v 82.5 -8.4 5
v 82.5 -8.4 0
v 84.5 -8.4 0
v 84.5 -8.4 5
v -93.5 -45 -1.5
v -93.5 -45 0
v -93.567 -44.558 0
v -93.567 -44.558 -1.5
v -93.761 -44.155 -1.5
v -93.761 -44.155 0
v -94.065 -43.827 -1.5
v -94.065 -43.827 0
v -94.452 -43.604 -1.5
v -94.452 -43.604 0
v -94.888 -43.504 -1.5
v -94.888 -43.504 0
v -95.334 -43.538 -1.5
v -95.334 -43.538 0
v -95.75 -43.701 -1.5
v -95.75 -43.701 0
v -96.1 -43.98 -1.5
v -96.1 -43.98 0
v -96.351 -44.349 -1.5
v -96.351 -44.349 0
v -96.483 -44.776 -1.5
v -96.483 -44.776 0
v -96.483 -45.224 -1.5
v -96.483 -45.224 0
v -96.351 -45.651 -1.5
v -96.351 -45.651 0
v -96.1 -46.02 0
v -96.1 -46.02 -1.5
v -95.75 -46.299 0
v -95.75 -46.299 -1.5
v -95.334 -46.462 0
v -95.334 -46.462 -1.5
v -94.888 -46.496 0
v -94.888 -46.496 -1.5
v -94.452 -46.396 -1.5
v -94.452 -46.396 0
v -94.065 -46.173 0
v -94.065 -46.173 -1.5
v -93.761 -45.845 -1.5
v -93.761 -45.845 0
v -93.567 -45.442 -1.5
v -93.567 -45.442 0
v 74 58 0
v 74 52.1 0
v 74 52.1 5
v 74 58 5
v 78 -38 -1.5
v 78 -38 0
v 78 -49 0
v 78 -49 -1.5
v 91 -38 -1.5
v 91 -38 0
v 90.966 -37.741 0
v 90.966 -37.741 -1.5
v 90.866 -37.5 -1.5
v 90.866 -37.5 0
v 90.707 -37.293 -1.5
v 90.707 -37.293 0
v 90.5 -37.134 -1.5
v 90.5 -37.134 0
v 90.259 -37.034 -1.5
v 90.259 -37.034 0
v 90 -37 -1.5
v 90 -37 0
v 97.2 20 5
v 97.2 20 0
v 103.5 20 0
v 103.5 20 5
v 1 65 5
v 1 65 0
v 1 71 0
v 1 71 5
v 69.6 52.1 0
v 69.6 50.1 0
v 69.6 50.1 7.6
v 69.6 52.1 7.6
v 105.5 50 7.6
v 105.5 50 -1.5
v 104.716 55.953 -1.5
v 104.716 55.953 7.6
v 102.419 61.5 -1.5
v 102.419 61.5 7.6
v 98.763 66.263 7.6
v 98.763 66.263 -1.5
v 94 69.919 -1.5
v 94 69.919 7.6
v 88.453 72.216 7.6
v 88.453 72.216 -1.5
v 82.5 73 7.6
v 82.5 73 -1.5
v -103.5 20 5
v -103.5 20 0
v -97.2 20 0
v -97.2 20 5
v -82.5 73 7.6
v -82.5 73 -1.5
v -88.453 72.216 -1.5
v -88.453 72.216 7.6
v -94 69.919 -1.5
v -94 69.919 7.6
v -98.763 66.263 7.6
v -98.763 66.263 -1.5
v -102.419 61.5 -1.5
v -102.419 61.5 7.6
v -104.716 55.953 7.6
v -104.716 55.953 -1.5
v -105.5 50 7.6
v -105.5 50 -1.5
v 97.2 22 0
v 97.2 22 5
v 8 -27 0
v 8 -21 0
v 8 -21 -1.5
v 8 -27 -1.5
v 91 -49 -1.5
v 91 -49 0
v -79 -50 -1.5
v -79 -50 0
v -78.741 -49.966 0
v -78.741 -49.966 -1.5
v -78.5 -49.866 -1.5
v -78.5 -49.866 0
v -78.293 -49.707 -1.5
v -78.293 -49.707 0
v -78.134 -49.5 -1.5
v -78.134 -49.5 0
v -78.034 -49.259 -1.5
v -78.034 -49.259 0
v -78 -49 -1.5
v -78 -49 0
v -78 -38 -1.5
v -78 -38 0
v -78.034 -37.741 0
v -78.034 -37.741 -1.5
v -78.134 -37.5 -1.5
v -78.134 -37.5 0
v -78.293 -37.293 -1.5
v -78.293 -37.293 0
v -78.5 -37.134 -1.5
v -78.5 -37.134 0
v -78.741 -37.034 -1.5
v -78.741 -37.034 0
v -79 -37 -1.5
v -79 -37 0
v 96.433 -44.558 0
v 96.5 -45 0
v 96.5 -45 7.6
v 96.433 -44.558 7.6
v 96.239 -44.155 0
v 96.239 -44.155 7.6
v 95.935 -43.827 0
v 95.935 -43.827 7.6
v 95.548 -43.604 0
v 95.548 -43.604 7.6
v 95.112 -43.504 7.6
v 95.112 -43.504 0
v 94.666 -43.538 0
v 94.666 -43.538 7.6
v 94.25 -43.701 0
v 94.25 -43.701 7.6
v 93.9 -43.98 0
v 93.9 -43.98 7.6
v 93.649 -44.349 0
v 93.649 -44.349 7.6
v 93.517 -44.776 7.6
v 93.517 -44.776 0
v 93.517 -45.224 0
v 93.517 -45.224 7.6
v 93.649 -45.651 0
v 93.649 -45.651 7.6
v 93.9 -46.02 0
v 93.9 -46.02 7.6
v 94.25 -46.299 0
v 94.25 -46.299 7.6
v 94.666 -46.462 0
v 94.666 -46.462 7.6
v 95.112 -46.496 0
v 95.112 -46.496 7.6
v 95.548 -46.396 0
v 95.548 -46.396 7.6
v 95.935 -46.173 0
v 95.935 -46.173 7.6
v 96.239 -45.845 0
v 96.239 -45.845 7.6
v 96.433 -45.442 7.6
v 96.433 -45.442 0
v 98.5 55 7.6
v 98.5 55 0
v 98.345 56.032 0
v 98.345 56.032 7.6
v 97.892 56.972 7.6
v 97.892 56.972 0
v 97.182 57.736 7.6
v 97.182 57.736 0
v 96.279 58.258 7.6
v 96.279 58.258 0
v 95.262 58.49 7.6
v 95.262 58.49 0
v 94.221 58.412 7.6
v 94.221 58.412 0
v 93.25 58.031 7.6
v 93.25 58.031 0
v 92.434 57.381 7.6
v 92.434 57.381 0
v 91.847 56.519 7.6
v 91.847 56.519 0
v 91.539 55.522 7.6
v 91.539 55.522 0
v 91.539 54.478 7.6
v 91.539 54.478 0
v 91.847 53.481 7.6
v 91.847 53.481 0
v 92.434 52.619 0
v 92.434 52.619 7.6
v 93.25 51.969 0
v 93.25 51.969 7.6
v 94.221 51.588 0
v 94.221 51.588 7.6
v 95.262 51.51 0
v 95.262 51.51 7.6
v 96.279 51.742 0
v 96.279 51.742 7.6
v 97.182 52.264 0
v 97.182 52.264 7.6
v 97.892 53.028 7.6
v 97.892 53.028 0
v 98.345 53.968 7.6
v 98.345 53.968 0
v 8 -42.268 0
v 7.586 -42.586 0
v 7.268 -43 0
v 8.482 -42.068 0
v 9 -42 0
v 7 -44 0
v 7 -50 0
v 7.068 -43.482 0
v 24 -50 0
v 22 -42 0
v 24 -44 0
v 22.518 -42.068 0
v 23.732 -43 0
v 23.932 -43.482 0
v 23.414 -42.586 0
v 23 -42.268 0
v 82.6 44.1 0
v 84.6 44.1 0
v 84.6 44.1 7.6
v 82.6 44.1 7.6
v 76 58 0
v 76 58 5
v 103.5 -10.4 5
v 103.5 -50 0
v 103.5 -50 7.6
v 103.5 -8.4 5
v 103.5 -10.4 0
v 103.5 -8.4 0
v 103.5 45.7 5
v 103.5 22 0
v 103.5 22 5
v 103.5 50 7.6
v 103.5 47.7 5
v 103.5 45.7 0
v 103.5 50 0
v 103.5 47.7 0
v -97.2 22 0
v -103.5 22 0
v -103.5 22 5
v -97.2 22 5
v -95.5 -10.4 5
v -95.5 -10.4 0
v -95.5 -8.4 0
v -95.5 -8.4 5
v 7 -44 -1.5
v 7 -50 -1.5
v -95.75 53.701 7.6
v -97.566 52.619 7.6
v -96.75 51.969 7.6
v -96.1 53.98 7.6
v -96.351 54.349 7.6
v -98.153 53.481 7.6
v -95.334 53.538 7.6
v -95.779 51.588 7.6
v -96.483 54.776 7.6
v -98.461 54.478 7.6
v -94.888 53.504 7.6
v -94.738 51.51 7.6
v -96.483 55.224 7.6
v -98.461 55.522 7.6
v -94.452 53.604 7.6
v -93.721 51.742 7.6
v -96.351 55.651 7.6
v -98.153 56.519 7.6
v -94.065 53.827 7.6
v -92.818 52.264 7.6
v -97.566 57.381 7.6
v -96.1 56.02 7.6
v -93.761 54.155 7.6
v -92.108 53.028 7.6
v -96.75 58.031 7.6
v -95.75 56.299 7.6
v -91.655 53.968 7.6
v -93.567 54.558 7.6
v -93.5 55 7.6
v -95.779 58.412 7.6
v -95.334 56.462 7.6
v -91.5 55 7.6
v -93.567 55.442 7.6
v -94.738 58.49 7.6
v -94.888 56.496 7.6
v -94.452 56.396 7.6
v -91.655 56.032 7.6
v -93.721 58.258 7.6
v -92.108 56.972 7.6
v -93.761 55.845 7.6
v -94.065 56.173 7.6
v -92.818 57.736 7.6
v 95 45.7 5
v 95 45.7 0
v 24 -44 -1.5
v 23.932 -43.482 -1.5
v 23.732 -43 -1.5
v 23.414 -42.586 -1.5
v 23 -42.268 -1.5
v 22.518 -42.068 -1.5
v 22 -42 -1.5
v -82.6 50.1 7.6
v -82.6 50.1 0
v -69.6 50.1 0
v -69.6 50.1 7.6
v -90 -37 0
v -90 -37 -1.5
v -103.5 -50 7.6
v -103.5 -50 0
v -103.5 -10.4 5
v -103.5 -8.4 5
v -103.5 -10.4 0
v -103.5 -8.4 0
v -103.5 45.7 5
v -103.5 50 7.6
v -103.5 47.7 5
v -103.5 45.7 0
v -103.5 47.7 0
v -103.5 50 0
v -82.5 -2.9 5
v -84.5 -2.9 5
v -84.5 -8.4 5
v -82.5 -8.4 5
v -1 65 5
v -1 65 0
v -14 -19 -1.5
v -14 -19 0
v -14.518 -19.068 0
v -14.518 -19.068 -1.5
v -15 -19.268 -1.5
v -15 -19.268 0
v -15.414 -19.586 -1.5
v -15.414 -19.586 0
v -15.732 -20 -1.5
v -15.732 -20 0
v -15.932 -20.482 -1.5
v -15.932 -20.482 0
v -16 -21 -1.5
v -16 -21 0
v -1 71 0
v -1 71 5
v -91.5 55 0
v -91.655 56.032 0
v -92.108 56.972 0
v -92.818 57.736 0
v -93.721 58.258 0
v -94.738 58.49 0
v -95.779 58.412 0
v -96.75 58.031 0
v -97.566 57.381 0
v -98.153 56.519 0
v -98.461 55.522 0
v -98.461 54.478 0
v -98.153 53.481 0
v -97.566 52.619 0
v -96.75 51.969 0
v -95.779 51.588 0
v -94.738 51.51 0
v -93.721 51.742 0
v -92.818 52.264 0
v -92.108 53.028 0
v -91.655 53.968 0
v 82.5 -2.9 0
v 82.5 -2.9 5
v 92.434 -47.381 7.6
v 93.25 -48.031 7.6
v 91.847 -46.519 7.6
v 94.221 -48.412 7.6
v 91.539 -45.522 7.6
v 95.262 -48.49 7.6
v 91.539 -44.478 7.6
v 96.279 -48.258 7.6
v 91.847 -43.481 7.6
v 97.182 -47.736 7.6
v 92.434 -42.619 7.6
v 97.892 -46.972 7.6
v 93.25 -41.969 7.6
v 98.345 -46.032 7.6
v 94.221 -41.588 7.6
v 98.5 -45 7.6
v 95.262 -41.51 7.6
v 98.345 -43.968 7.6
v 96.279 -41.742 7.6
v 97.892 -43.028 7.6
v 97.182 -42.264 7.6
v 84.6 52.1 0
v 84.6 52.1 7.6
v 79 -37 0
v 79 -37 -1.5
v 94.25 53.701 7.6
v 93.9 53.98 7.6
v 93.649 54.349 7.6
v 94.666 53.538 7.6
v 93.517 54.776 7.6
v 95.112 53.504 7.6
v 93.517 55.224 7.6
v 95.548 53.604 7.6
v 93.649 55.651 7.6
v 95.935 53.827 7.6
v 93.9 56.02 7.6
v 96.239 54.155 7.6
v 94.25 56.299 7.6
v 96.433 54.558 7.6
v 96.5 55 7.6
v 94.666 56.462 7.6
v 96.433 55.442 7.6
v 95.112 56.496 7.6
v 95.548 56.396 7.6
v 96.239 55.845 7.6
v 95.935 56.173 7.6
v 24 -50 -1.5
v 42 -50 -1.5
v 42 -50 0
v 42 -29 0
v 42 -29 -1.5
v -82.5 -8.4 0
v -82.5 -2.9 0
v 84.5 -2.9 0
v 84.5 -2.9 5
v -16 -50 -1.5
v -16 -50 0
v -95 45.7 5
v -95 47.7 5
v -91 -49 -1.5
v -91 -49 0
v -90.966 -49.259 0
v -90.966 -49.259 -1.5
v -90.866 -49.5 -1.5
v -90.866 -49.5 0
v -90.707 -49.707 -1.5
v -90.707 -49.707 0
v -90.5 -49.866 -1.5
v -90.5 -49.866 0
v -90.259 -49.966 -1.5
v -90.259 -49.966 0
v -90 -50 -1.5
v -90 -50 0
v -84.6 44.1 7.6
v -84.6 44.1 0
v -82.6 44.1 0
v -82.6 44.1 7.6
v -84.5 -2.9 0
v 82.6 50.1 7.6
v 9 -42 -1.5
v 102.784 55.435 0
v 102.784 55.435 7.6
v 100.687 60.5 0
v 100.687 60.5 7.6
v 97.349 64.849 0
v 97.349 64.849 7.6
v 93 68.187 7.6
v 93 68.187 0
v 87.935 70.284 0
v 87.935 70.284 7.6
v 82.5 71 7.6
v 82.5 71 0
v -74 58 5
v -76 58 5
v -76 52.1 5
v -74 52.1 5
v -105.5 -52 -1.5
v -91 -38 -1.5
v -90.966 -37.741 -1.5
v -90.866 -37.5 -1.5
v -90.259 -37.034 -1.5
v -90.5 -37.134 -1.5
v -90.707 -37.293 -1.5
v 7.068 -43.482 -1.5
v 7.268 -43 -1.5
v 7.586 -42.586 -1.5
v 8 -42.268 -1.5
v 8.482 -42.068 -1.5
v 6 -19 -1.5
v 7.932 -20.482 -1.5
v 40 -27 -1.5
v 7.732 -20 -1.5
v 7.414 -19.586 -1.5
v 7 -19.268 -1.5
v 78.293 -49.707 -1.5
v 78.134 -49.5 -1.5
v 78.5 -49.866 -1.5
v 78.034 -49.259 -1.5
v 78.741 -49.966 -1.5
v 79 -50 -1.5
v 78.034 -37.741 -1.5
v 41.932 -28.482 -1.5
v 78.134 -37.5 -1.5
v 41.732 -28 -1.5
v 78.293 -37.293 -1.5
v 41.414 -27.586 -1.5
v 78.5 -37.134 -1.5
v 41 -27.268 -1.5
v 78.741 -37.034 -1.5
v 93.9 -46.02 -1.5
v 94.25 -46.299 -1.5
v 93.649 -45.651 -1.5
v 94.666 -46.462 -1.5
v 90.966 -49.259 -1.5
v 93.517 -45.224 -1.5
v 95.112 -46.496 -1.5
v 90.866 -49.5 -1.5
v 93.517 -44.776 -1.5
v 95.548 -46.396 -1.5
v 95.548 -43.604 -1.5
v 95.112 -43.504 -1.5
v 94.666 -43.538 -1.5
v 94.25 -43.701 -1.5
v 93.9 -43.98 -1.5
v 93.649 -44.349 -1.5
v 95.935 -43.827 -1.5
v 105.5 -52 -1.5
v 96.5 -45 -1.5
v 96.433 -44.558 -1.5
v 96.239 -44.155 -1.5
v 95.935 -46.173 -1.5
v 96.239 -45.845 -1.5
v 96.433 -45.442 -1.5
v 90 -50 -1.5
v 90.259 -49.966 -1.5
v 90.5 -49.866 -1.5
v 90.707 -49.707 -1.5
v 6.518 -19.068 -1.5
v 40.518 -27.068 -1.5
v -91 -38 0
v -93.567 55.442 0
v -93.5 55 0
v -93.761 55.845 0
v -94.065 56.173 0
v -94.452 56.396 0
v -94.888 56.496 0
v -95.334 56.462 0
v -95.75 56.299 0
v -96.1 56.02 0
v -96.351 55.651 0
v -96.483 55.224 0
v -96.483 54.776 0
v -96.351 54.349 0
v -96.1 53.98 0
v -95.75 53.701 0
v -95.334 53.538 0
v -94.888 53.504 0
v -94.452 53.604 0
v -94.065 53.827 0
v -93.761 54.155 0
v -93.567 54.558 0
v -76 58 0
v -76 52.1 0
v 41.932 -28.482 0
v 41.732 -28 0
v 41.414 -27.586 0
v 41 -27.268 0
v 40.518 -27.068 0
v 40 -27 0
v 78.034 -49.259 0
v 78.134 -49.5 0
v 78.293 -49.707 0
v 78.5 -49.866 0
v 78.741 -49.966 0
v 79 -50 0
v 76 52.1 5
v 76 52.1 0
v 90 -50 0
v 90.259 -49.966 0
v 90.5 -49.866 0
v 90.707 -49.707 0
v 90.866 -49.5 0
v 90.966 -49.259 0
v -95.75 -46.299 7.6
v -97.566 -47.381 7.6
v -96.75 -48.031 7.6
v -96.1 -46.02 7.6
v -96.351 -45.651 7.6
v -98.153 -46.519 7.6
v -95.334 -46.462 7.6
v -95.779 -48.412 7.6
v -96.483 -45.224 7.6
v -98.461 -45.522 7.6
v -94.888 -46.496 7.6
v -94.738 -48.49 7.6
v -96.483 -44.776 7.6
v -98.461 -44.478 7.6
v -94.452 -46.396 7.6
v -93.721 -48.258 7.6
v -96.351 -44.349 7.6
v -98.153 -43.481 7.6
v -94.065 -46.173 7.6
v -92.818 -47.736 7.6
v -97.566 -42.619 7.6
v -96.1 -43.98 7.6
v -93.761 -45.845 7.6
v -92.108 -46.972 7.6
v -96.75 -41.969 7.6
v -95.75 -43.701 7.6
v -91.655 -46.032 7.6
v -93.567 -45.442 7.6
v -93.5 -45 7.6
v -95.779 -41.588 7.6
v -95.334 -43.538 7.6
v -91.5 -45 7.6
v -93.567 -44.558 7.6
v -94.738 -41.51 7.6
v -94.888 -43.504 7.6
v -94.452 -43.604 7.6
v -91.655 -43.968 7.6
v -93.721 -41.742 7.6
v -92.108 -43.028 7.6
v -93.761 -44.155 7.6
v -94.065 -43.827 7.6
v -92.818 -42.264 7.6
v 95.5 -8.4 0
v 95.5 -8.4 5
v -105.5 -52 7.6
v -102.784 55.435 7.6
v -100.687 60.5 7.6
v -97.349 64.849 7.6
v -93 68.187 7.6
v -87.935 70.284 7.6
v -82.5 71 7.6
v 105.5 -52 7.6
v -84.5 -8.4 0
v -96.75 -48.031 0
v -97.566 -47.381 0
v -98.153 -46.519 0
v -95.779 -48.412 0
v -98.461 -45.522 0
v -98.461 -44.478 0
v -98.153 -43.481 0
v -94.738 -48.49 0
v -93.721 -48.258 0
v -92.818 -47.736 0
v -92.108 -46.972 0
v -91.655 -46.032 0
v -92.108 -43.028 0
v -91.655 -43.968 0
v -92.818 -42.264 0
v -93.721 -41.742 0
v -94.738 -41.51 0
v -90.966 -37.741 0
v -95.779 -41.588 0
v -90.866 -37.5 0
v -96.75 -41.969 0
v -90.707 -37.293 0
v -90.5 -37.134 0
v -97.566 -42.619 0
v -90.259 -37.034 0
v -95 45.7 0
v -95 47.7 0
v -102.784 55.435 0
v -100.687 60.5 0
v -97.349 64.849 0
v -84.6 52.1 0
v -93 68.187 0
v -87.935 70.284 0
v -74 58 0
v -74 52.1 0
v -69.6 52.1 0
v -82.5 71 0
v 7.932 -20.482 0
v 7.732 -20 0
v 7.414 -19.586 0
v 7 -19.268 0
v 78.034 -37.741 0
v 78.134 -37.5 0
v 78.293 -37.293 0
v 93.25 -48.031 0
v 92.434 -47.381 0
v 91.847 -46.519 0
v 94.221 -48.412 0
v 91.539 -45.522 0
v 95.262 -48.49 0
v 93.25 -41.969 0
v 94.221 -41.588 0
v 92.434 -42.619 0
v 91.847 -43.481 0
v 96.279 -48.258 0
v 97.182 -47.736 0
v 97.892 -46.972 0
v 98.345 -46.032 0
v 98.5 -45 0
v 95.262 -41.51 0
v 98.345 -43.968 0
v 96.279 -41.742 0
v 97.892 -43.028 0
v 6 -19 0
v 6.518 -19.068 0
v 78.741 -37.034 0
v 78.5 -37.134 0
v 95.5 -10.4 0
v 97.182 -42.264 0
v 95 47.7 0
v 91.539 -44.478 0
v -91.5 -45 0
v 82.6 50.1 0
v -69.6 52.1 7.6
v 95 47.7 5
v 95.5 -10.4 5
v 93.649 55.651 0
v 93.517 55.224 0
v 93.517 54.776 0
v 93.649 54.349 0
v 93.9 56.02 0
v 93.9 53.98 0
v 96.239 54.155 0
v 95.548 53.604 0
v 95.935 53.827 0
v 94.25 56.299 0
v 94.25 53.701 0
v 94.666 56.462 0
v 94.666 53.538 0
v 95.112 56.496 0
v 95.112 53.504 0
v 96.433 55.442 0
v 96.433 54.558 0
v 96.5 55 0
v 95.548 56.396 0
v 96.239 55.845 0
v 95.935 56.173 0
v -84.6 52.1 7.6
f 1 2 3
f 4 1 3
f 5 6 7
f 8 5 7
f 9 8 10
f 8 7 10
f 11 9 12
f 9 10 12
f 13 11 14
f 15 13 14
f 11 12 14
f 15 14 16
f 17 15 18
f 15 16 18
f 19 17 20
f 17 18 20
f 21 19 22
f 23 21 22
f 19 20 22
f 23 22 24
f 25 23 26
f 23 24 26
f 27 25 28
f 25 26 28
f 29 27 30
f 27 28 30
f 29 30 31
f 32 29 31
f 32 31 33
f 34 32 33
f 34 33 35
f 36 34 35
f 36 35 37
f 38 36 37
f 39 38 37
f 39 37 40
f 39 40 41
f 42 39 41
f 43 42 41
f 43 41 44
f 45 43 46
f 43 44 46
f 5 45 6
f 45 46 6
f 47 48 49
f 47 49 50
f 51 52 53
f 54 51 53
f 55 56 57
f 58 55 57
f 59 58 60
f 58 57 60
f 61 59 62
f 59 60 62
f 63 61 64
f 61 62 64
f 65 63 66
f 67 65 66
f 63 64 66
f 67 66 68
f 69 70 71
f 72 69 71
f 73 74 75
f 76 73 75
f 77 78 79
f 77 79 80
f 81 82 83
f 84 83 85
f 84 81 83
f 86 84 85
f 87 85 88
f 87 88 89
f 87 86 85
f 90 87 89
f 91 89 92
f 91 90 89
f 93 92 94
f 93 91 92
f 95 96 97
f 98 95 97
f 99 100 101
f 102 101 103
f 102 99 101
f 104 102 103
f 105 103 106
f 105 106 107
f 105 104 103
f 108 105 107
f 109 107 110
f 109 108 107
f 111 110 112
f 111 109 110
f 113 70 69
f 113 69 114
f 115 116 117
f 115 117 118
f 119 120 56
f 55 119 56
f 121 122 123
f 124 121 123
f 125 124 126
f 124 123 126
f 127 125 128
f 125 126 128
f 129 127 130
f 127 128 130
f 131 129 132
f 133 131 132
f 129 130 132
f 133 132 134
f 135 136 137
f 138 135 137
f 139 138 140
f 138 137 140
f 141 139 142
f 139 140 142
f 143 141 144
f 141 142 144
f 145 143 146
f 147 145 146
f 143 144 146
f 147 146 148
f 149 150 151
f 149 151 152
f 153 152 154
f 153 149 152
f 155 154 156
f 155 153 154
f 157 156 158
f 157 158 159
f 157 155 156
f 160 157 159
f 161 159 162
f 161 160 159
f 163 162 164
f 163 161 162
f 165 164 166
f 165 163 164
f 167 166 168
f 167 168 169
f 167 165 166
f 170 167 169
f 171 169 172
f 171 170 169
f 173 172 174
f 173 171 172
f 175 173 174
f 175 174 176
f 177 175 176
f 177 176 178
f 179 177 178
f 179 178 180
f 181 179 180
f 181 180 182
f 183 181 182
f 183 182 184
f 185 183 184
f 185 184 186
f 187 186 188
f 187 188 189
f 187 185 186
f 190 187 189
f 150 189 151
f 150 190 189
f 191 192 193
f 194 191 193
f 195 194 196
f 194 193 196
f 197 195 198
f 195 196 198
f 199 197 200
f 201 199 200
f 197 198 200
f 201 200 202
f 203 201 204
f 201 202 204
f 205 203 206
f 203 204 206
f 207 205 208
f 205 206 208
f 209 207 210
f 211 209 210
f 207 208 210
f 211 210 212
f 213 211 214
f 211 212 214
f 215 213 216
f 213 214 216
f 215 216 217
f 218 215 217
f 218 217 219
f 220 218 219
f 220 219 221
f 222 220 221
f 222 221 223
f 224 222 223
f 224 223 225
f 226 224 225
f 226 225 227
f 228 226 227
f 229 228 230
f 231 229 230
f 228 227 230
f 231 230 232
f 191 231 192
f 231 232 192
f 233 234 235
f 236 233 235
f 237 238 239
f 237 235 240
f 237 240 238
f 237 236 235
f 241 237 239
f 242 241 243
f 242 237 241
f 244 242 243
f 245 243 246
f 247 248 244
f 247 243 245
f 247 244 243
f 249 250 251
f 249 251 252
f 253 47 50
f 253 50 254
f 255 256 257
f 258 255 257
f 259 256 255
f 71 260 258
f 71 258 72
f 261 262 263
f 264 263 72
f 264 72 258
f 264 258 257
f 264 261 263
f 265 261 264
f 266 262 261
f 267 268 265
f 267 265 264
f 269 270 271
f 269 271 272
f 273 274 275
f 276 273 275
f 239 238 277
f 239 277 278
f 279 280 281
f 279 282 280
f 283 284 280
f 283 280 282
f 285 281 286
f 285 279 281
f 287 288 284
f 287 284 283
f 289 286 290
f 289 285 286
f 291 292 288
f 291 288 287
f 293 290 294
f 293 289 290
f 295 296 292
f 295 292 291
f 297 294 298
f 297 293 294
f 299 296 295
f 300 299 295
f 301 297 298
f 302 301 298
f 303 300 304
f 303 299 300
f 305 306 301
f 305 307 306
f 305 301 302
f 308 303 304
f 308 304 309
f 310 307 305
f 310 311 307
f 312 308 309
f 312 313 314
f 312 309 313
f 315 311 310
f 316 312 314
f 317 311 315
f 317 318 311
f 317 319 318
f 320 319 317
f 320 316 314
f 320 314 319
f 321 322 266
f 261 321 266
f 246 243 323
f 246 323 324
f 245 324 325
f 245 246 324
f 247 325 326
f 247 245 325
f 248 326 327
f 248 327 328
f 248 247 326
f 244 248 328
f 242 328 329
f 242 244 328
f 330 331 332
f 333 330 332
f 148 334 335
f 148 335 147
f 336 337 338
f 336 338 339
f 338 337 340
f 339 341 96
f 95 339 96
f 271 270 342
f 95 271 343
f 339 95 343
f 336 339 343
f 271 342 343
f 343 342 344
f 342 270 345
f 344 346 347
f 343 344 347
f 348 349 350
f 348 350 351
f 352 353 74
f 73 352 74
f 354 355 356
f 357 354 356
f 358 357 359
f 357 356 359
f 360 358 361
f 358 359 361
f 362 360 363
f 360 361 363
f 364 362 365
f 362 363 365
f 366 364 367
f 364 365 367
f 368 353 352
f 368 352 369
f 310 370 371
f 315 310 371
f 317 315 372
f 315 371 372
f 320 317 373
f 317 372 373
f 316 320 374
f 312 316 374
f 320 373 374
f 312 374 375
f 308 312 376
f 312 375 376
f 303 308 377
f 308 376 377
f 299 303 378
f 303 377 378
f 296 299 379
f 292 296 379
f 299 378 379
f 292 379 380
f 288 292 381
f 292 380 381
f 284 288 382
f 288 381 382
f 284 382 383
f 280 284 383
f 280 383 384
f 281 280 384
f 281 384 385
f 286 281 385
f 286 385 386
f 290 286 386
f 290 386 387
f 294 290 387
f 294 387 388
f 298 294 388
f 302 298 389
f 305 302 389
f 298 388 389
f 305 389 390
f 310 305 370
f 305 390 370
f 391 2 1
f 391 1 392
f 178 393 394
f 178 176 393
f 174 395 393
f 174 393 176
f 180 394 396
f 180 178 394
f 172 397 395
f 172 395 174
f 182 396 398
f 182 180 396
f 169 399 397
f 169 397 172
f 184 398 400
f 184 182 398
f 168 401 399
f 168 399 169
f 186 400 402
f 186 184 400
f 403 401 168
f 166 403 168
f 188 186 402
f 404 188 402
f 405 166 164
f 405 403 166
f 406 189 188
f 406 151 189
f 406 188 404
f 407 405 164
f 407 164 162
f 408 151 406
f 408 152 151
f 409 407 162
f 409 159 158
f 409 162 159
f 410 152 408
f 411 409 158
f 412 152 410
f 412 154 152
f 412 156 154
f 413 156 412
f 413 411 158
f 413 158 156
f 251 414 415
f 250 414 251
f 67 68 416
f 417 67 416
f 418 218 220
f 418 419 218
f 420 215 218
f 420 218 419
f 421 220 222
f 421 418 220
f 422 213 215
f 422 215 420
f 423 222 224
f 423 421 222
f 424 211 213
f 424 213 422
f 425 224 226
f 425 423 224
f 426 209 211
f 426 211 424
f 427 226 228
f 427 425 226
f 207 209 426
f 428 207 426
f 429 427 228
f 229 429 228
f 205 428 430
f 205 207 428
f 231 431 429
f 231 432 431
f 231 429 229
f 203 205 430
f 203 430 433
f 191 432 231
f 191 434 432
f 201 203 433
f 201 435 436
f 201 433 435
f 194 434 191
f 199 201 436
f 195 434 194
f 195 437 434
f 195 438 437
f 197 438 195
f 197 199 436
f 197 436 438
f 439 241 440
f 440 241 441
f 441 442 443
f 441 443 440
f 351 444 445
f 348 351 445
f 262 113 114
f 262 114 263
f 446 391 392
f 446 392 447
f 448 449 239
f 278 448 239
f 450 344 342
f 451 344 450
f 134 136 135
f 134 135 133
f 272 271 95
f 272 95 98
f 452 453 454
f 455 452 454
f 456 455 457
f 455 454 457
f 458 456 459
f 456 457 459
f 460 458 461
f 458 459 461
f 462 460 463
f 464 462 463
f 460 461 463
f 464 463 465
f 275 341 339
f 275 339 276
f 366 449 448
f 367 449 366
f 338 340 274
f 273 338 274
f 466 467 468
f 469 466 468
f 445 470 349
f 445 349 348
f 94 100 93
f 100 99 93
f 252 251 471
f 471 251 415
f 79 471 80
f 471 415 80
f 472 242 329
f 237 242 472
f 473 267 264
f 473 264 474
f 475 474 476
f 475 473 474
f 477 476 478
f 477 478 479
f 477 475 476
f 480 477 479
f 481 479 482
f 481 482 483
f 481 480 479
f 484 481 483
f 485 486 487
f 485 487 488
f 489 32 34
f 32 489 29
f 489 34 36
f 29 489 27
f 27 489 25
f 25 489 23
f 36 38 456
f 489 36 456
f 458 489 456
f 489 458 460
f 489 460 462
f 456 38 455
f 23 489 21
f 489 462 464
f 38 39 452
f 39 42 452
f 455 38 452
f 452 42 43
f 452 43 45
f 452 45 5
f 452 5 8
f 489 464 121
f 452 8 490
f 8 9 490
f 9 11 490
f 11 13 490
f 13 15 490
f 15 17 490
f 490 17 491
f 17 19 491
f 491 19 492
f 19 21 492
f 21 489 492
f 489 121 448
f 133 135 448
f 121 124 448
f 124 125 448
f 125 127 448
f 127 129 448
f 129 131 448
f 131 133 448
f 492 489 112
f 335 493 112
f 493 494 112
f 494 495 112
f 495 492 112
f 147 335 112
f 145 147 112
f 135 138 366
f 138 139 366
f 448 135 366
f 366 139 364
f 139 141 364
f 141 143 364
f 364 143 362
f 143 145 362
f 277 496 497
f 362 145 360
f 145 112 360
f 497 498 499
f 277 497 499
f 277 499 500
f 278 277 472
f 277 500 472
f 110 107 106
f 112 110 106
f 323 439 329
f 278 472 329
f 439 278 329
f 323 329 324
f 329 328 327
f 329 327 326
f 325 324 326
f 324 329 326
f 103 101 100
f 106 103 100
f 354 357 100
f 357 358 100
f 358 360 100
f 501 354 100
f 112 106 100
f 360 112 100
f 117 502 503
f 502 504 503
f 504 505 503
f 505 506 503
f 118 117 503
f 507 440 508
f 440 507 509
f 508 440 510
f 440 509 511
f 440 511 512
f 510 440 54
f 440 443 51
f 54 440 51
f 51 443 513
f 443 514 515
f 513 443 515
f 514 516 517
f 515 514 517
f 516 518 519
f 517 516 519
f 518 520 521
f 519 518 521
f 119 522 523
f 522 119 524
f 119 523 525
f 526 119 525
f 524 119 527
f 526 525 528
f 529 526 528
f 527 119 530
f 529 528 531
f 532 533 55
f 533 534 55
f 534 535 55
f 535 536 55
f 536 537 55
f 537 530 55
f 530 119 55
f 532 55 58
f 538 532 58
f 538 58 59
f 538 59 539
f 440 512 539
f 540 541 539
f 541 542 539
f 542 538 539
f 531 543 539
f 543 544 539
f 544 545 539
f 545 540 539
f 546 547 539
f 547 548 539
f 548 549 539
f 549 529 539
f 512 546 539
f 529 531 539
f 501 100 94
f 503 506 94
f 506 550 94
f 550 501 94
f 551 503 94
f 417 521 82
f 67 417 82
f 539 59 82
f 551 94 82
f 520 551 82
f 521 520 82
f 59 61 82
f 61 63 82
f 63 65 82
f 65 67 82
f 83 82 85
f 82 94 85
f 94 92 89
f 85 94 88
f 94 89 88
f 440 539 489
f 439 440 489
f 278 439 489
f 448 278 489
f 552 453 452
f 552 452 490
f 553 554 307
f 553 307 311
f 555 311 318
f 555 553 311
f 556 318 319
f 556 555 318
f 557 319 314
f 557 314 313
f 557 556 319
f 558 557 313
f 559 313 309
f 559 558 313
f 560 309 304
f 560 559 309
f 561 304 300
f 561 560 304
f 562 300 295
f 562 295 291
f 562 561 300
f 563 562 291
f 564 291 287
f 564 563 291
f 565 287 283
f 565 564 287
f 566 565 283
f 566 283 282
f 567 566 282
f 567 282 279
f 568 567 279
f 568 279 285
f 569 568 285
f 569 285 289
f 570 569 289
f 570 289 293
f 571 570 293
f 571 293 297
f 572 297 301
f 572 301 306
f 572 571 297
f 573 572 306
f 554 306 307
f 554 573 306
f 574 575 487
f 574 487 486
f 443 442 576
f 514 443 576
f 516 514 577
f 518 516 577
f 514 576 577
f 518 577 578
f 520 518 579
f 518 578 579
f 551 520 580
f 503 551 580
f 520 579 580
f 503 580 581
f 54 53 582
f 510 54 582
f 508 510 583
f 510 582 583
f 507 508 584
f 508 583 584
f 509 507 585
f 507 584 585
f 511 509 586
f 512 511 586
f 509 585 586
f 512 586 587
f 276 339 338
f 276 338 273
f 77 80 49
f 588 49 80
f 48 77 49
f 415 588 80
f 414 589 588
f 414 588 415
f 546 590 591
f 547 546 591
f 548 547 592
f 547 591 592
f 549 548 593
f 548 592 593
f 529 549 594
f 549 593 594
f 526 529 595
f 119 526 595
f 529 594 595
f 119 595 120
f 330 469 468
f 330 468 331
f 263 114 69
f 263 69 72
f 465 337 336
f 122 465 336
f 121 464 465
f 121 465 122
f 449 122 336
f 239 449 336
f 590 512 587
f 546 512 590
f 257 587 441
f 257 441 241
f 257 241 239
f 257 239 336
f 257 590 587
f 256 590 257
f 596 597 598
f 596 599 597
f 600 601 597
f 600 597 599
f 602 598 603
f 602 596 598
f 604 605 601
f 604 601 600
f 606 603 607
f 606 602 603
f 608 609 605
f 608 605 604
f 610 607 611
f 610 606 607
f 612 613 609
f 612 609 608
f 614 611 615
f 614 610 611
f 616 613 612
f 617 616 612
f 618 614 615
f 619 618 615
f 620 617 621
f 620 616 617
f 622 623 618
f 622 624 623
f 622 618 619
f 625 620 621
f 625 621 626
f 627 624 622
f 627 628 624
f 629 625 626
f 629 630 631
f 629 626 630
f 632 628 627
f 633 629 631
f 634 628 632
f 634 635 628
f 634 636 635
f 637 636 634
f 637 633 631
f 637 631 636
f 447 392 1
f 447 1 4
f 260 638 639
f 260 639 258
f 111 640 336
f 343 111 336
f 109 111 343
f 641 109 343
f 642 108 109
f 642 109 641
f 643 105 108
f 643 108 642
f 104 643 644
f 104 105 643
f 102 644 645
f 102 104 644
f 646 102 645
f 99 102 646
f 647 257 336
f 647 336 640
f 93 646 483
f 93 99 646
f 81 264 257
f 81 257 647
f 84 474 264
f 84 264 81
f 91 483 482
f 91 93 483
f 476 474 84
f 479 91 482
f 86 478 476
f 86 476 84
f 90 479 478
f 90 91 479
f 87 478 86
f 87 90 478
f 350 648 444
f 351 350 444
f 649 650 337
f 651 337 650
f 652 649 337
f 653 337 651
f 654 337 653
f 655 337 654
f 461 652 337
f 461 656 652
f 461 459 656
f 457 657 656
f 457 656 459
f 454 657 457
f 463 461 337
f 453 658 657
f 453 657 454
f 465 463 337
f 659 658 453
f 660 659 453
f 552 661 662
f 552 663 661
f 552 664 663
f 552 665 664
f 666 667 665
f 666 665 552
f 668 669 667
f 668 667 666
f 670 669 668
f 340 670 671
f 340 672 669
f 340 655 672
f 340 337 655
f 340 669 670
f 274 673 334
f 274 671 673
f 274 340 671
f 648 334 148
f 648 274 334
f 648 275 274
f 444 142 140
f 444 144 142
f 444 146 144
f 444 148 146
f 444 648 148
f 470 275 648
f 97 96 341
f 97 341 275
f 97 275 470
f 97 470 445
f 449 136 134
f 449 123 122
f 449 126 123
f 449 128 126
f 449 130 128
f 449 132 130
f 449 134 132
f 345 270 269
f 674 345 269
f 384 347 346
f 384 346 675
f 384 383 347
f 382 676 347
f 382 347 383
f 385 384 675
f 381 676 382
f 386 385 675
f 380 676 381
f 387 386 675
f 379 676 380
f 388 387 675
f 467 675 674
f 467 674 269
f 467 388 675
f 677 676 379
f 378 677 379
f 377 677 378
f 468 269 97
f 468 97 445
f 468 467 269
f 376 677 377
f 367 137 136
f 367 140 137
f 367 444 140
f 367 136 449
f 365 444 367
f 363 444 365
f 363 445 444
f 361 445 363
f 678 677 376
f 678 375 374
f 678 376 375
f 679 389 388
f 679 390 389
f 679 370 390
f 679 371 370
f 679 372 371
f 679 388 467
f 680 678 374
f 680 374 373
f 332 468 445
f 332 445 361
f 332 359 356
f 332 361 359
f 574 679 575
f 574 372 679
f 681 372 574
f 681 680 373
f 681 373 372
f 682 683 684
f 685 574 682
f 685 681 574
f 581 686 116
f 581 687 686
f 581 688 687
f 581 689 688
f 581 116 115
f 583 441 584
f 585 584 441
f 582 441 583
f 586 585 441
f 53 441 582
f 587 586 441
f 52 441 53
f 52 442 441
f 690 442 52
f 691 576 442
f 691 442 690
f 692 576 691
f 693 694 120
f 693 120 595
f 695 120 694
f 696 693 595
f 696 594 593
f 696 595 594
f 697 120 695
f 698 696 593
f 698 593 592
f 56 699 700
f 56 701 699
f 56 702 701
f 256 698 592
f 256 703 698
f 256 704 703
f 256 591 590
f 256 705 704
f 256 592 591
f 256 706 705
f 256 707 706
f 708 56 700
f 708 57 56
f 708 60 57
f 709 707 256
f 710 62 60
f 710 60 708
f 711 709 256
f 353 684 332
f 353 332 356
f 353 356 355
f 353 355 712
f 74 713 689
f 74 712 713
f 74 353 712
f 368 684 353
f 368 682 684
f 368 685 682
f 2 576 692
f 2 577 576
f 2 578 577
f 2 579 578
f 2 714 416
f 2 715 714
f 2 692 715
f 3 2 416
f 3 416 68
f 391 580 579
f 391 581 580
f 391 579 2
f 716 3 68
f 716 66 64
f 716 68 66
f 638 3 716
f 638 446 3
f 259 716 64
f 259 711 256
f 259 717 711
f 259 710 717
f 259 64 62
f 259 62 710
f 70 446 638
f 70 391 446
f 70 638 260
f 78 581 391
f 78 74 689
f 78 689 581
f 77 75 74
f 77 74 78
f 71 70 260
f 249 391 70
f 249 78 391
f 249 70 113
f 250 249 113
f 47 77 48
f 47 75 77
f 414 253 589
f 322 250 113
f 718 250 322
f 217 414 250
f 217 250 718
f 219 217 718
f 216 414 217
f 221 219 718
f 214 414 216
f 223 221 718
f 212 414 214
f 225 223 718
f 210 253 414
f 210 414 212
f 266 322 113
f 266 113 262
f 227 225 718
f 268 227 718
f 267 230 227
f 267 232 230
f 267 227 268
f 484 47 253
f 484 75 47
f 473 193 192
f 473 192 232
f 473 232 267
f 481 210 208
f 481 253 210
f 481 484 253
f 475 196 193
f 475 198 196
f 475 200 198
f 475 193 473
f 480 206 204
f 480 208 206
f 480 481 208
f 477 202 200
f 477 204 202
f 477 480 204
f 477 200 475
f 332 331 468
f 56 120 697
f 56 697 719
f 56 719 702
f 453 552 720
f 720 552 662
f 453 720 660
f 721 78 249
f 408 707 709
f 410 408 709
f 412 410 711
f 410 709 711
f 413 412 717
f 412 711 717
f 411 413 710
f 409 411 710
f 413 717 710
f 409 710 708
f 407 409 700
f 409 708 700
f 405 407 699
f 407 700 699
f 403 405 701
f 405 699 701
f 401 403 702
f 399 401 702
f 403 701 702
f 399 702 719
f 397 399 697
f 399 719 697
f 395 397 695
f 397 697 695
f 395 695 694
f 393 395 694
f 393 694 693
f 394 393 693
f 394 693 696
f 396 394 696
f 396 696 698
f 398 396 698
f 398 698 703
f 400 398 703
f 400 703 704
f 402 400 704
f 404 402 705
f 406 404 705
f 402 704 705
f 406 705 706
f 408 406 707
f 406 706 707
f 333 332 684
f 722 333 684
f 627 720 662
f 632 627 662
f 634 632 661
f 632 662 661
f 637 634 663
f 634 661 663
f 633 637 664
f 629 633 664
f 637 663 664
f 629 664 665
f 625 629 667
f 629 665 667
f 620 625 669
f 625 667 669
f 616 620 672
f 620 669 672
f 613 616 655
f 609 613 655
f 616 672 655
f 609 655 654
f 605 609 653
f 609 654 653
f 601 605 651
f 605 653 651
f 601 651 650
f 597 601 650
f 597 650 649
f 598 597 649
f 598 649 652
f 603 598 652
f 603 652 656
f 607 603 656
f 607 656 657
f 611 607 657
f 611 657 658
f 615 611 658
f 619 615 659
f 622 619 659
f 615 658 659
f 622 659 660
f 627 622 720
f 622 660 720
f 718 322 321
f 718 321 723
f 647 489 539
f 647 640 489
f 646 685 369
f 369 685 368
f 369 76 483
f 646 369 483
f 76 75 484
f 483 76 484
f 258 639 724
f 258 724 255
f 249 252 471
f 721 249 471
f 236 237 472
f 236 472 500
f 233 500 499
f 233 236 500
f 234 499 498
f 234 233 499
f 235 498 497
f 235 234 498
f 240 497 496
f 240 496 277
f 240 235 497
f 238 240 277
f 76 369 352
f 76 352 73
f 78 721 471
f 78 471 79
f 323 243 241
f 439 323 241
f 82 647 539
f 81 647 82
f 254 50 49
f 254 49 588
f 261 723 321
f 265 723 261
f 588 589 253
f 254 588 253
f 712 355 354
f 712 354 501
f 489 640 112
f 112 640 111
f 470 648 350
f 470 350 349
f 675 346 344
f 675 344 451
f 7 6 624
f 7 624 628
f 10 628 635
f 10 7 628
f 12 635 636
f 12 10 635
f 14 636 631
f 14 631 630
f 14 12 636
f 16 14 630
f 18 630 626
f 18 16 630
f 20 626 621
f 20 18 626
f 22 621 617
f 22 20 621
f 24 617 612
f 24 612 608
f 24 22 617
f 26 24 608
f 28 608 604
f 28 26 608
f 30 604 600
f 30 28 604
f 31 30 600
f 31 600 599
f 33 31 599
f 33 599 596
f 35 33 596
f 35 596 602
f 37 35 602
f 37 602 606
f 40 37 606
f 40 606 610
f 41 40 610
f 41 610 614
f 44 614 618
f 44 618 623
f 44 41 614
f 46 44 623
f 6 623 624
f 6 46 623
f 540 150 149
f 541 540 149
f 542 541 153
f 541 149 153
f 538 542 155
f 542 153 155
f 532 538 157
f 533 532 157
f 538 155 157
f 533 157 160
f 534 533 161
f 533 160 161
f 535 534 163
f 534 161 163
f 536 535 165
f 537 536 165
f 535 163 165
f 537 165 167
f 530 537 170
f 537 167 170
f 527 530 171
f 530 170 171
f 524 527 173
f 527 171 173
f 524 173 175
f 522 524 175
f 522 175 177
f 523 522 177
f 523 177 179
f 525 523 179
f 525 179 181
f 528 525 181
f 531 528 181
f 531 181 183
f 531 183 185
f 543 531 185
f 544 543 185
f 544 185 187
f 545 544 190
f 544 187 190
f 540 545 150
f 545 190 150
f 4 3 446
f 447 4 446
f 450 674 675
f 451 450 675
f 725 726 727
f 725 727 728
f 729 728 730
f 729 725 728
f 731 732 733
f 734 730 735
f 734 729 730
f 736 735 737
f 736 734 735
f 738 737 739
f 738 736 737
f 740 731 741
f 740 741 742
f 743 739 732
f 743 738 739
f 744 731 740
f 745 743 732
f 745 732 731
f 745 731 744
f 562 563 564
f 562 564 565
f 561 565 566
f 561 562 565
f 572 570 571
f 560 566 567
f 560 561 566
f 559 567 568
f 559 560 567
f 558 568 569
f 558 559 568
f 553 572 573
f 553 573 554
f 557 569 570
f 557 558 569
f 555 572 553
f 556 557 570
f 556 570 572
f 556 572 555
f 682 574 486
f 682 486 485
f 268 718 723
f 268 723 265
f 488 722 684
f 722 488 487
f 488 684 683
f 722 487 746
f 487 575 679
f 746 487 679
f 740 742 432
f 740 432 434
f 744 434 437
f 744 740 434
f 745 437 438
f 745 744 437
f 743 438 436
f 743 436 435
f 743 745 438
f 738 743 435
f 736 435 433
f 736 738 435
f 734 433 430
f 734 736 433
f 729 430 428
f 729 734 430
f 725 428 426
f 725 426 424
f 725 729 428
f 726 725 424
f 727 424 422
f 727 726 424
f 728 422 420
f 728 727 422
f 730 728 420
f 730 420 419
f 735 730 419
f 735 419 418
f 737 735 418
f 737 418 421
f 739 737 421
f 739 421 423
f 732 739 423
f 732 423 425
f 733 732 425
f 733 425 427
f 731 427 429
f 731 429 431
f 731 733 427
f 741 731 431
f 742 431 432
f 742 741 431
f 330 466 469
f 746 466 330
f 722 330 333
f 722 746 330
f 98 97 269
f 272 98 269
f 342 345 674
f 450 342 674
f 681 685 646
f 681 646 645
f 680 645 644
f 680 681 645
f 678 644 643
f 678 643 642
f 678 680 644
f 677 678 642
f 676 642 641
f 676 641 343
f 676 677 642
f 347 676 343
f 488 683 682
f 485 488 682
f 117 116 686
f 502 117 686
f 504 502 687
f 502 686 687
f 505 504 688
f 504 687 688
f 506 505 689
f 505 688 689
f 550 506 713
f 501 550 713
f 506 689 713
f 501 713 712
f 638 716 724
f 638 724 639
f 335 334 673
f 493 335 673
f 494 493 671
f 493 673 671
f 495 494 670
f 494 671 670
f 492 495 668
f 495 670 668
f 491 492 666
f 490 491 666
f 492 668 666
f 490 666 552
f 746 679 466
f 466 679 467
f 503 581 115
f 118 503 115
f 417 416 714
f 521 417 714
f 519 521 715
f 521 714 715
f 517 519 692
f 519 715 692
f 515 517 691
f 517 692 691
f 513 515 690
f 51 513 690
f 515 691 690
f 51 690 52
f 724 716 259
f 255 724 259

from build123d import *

# Parameters (mm, degrees)
SKETCH004_W      = 8.5
SKETCH004_H      = 2
SKETCH004_W_2    = 8
SKETCH004_W_3    = 2
SKETCH004_H_2    = 5.5
SKETCH004_H_3    = 6
SKETCH004_W_4    = 6.4
EXTRUDE001_DEPTH = 5
SKETCH002_R      = 1.5
PAD001_DEPTH     = 1.5
SKETCH003_R      = 3.5
SKETCH003_R_2    = 1.5
EXTRUDE_DEPTH    = 7.6


with BuildPart() as extrude001:
    # Sketch004 → Extrude001 (new body)
    with BuildSketch(Plane.XY):
        with Locations((-99.25, 46.7)):
            Rectangle(SKETCH004_W, SKETCH004_H)
        with Locations((99.25, 46.7)):
            Rectangle(SKETCH004_W, SKETCH004_H)
        with Locations((-99.5, -9.4)):
            Rectangle(SKETCH004_W_2, SKETCH004_H)
        with Locations((-83.5, -5.65)):
            Rectangle(SKETCH004_W_3, SKETCH004_H_2)
        with Locations((99.5, -9.4)):
            Rectangle(SKETCH004_W_2, SKETCH004_H)
        with Locations((83.5, -5.65)):
            Rectangle(SKETCH004_W_3, SKETCH004_H_2)
        with Locations((-75, 55)):
            Rectangle(SKETCH004_W_3, SKETCH004_H_3)
        with Locations((75, 55)):
            Rectangle(SKETCH004_W_3, SKETCH004_H_3)
        with Locations((-100.4, 21)):
            Rectangle(SKETCH004_W_4, SKETCH004_H)
        with Locations((100.4, 21)):
            Rectangle(SKETCH004_W_4, SKETCH004_H)
        with Locations((0, 68)):
            Rectangle(SKETCH004_W_3, SKETCH004_H_3)
    extrude(amount=EXTRUDE001_DEPTH)


with BuildPart() as body:
    # Sketch002 → Pad001 (new body)
    with BuildSketch(Plane.XY):
        with BuildLine():
            Line((-105.5, -52), (105.5, -52))
            Line((105.5, -52), (105.5, 50))
            ThreePointArc((105.5, 50), (98.763456, 66.263456), (82.5, 73))
            Line((-82.5, 73), (82.5, 73))
            ThreePointArc((-82.5, 73), (-98.763456, 66.263456), (-105.5, 50))
            Line((-105.5, -52), (-105.5, 50))
        make_face()
        with Locations((-95, -45)):
            Circle(SKETCH002_R, mode=Mode.SUBTRACT)
        with Locations((95, -45)):
            Circle(SKETCH002_R, mode=Mode.SUBTRACT)
        with BuildLine():
            Line((-14, -19.000009), (6, -19.000009))
            ThreePointArc((8, -21.000009), (7.414214, -19.585795), (6, -19.000009))
            Line((8, -21.000009), (8, -27.000009))
            Line((40, -27.000009), (8, -27.000009))
            ThreePointArc((42, -29.000009), (41.414214, -27.585795), (40, -27.000009))
            Line((42, -29.000009), (42, -50.000009))
            Line((24, -50.000009), (42, -50.000009))
            Line((24, -44.000009), (24, -50.000009))
            ThreePointArc((24, -44.000009), (23.414217, -42.58579), (22, -42))
            Line((22, -42), (9, -42))
            ThreePointArc((9, -42), (7.585783, -42.58579), (7, -44.000009))
            Line((7, -44.000009), (7, -50.000009))
            Line((-16, -50.000009), (7, -50.000009))
            Line((-16, -50.000009), (-16, -21.000009))
            ThreePointArc((-14, -19.000009), (-15.414214, -19.585795), (-16, -21.000009))
        make_face(mode=Mode.SUBTRACT)
        with BuildLine():
            ThreePointArc((-90, -37), (-90.707107, -37.292893), (-91, -38))
            Line((-91, -49), (-91, -38))
            ThreePointArc((-91, -49), (-90.707107, -49.707107), (-90, -50))
            Line((-79, -50), (-90, -50))
            ThreePointArc((-79, -50), (-78.292893, -49.707107), (-78, -49))
            Line((-78, -38), (-78, -49))
            ThreePointArc((-78, -38), (-78.292893, -37.292893), (-79, -37))
            Line((-90, -37), (-79, -37))
        make_face(mode=Mode.SUBTRACT)
        with BuildLine():
            ThreePointArc((91, -38), (90.707107, -37.292893), (90, -37))
            Line((90, -37), (79, -37))
            ThreePointArc((79, -37), (78.292893, -37.292893), (78, -38))
            Line((78, -38), (78, -49))
            ThreePointArc((78, -49), (78.292893, -49.707107), (79, -50))
            Line((79, -50), (90, -50))
            ThreePointArc((90, -50), (90.707107, -49.707107), (91, -49))
            Line((91, -49), (91, -38))
        make_face(mode=Mode.SUBTRACT)
    extrude(amount=-PAD001_DEPTH)


with BuildPart() as main:
    # Sketch003 → Extrude (new body)
    with BuildSketch(Plane.XY):
        with BuildLine():
            Line((-105.5, -52), (105.5, -52))
            Line((105.5, -52), (105.5, 50))
            ThreePointArc((105.5, 50), (98.763456, 66.263456), (82.5, 73))
            Line((-82.5, 73), (82.5, 73))
            ThreePointArc((-82.5, 73), (-98.763456, 66.263456), (-105.5, 50))
            Line((-105.5, -52), (-105.5, 50))
        make_face()
        with BuildLine():
            Line((-103.5, -50), (103.5, -50))
            Line((103.5, -50), (103.5, 50))
            ThreePointArc((103.5, 50), (97.349242, 64.849242), (82.5, 71))
            Line((-82.5, 71), (82.5, 71))
            ThreePointArc((-82.5, 71), (-97.349242, 64.849242), (-103.5, 50))
            Line((-103.5, -50), (-103.5, 50))
        make_face(mode=Mode.SUBTRACT)
        with Locations((-95, -45)):
            Circle(SKETCH003_R)
        with Locations((-95, -45)):
            Circle(SKETCH003_R_2, mode=Mode.SUBTRACT)
        with Locations((95, -45)):
            Circle(SKETCH003_R)
        with Locations((95, -45)):
            Circle(SKETCH003_R_2, mode=Mode.SUBTRACT)
        with Locations((-95, 55)):
            Circle(SKETCH003_R)
        with Locations((-95, 55)):
            Circle(SKETCH003_R_2, mode=Mode.SUBTRACT)
        with Locations((95, 55)):
            Circle(SKETCH003_R)
        with Locations((95, 55)):
            Circle(SKETCH003_R_2, mode=Mode.SUBTRACT)
        Polygon((-84.6, 44.1), (-82.6, 44.1), (-82.6, 50.1), (-69.6, 50.1), (-69.6, 52.1), (-84.6, 52.1), align=None)
        Polygon((84.6, 44.1), (82.6, 44.1), (82.6, 50.1), (69.6, 50.1), (69.6, 52.1), (84.6, 52.1), align=None)
    extrude(amount=EXTRUDE_DEPTH)

    # Fusion: union Body
    add(body.part)

    # Fusion001: union Extrude001
    add(extrude001.part)


solid = main.part
